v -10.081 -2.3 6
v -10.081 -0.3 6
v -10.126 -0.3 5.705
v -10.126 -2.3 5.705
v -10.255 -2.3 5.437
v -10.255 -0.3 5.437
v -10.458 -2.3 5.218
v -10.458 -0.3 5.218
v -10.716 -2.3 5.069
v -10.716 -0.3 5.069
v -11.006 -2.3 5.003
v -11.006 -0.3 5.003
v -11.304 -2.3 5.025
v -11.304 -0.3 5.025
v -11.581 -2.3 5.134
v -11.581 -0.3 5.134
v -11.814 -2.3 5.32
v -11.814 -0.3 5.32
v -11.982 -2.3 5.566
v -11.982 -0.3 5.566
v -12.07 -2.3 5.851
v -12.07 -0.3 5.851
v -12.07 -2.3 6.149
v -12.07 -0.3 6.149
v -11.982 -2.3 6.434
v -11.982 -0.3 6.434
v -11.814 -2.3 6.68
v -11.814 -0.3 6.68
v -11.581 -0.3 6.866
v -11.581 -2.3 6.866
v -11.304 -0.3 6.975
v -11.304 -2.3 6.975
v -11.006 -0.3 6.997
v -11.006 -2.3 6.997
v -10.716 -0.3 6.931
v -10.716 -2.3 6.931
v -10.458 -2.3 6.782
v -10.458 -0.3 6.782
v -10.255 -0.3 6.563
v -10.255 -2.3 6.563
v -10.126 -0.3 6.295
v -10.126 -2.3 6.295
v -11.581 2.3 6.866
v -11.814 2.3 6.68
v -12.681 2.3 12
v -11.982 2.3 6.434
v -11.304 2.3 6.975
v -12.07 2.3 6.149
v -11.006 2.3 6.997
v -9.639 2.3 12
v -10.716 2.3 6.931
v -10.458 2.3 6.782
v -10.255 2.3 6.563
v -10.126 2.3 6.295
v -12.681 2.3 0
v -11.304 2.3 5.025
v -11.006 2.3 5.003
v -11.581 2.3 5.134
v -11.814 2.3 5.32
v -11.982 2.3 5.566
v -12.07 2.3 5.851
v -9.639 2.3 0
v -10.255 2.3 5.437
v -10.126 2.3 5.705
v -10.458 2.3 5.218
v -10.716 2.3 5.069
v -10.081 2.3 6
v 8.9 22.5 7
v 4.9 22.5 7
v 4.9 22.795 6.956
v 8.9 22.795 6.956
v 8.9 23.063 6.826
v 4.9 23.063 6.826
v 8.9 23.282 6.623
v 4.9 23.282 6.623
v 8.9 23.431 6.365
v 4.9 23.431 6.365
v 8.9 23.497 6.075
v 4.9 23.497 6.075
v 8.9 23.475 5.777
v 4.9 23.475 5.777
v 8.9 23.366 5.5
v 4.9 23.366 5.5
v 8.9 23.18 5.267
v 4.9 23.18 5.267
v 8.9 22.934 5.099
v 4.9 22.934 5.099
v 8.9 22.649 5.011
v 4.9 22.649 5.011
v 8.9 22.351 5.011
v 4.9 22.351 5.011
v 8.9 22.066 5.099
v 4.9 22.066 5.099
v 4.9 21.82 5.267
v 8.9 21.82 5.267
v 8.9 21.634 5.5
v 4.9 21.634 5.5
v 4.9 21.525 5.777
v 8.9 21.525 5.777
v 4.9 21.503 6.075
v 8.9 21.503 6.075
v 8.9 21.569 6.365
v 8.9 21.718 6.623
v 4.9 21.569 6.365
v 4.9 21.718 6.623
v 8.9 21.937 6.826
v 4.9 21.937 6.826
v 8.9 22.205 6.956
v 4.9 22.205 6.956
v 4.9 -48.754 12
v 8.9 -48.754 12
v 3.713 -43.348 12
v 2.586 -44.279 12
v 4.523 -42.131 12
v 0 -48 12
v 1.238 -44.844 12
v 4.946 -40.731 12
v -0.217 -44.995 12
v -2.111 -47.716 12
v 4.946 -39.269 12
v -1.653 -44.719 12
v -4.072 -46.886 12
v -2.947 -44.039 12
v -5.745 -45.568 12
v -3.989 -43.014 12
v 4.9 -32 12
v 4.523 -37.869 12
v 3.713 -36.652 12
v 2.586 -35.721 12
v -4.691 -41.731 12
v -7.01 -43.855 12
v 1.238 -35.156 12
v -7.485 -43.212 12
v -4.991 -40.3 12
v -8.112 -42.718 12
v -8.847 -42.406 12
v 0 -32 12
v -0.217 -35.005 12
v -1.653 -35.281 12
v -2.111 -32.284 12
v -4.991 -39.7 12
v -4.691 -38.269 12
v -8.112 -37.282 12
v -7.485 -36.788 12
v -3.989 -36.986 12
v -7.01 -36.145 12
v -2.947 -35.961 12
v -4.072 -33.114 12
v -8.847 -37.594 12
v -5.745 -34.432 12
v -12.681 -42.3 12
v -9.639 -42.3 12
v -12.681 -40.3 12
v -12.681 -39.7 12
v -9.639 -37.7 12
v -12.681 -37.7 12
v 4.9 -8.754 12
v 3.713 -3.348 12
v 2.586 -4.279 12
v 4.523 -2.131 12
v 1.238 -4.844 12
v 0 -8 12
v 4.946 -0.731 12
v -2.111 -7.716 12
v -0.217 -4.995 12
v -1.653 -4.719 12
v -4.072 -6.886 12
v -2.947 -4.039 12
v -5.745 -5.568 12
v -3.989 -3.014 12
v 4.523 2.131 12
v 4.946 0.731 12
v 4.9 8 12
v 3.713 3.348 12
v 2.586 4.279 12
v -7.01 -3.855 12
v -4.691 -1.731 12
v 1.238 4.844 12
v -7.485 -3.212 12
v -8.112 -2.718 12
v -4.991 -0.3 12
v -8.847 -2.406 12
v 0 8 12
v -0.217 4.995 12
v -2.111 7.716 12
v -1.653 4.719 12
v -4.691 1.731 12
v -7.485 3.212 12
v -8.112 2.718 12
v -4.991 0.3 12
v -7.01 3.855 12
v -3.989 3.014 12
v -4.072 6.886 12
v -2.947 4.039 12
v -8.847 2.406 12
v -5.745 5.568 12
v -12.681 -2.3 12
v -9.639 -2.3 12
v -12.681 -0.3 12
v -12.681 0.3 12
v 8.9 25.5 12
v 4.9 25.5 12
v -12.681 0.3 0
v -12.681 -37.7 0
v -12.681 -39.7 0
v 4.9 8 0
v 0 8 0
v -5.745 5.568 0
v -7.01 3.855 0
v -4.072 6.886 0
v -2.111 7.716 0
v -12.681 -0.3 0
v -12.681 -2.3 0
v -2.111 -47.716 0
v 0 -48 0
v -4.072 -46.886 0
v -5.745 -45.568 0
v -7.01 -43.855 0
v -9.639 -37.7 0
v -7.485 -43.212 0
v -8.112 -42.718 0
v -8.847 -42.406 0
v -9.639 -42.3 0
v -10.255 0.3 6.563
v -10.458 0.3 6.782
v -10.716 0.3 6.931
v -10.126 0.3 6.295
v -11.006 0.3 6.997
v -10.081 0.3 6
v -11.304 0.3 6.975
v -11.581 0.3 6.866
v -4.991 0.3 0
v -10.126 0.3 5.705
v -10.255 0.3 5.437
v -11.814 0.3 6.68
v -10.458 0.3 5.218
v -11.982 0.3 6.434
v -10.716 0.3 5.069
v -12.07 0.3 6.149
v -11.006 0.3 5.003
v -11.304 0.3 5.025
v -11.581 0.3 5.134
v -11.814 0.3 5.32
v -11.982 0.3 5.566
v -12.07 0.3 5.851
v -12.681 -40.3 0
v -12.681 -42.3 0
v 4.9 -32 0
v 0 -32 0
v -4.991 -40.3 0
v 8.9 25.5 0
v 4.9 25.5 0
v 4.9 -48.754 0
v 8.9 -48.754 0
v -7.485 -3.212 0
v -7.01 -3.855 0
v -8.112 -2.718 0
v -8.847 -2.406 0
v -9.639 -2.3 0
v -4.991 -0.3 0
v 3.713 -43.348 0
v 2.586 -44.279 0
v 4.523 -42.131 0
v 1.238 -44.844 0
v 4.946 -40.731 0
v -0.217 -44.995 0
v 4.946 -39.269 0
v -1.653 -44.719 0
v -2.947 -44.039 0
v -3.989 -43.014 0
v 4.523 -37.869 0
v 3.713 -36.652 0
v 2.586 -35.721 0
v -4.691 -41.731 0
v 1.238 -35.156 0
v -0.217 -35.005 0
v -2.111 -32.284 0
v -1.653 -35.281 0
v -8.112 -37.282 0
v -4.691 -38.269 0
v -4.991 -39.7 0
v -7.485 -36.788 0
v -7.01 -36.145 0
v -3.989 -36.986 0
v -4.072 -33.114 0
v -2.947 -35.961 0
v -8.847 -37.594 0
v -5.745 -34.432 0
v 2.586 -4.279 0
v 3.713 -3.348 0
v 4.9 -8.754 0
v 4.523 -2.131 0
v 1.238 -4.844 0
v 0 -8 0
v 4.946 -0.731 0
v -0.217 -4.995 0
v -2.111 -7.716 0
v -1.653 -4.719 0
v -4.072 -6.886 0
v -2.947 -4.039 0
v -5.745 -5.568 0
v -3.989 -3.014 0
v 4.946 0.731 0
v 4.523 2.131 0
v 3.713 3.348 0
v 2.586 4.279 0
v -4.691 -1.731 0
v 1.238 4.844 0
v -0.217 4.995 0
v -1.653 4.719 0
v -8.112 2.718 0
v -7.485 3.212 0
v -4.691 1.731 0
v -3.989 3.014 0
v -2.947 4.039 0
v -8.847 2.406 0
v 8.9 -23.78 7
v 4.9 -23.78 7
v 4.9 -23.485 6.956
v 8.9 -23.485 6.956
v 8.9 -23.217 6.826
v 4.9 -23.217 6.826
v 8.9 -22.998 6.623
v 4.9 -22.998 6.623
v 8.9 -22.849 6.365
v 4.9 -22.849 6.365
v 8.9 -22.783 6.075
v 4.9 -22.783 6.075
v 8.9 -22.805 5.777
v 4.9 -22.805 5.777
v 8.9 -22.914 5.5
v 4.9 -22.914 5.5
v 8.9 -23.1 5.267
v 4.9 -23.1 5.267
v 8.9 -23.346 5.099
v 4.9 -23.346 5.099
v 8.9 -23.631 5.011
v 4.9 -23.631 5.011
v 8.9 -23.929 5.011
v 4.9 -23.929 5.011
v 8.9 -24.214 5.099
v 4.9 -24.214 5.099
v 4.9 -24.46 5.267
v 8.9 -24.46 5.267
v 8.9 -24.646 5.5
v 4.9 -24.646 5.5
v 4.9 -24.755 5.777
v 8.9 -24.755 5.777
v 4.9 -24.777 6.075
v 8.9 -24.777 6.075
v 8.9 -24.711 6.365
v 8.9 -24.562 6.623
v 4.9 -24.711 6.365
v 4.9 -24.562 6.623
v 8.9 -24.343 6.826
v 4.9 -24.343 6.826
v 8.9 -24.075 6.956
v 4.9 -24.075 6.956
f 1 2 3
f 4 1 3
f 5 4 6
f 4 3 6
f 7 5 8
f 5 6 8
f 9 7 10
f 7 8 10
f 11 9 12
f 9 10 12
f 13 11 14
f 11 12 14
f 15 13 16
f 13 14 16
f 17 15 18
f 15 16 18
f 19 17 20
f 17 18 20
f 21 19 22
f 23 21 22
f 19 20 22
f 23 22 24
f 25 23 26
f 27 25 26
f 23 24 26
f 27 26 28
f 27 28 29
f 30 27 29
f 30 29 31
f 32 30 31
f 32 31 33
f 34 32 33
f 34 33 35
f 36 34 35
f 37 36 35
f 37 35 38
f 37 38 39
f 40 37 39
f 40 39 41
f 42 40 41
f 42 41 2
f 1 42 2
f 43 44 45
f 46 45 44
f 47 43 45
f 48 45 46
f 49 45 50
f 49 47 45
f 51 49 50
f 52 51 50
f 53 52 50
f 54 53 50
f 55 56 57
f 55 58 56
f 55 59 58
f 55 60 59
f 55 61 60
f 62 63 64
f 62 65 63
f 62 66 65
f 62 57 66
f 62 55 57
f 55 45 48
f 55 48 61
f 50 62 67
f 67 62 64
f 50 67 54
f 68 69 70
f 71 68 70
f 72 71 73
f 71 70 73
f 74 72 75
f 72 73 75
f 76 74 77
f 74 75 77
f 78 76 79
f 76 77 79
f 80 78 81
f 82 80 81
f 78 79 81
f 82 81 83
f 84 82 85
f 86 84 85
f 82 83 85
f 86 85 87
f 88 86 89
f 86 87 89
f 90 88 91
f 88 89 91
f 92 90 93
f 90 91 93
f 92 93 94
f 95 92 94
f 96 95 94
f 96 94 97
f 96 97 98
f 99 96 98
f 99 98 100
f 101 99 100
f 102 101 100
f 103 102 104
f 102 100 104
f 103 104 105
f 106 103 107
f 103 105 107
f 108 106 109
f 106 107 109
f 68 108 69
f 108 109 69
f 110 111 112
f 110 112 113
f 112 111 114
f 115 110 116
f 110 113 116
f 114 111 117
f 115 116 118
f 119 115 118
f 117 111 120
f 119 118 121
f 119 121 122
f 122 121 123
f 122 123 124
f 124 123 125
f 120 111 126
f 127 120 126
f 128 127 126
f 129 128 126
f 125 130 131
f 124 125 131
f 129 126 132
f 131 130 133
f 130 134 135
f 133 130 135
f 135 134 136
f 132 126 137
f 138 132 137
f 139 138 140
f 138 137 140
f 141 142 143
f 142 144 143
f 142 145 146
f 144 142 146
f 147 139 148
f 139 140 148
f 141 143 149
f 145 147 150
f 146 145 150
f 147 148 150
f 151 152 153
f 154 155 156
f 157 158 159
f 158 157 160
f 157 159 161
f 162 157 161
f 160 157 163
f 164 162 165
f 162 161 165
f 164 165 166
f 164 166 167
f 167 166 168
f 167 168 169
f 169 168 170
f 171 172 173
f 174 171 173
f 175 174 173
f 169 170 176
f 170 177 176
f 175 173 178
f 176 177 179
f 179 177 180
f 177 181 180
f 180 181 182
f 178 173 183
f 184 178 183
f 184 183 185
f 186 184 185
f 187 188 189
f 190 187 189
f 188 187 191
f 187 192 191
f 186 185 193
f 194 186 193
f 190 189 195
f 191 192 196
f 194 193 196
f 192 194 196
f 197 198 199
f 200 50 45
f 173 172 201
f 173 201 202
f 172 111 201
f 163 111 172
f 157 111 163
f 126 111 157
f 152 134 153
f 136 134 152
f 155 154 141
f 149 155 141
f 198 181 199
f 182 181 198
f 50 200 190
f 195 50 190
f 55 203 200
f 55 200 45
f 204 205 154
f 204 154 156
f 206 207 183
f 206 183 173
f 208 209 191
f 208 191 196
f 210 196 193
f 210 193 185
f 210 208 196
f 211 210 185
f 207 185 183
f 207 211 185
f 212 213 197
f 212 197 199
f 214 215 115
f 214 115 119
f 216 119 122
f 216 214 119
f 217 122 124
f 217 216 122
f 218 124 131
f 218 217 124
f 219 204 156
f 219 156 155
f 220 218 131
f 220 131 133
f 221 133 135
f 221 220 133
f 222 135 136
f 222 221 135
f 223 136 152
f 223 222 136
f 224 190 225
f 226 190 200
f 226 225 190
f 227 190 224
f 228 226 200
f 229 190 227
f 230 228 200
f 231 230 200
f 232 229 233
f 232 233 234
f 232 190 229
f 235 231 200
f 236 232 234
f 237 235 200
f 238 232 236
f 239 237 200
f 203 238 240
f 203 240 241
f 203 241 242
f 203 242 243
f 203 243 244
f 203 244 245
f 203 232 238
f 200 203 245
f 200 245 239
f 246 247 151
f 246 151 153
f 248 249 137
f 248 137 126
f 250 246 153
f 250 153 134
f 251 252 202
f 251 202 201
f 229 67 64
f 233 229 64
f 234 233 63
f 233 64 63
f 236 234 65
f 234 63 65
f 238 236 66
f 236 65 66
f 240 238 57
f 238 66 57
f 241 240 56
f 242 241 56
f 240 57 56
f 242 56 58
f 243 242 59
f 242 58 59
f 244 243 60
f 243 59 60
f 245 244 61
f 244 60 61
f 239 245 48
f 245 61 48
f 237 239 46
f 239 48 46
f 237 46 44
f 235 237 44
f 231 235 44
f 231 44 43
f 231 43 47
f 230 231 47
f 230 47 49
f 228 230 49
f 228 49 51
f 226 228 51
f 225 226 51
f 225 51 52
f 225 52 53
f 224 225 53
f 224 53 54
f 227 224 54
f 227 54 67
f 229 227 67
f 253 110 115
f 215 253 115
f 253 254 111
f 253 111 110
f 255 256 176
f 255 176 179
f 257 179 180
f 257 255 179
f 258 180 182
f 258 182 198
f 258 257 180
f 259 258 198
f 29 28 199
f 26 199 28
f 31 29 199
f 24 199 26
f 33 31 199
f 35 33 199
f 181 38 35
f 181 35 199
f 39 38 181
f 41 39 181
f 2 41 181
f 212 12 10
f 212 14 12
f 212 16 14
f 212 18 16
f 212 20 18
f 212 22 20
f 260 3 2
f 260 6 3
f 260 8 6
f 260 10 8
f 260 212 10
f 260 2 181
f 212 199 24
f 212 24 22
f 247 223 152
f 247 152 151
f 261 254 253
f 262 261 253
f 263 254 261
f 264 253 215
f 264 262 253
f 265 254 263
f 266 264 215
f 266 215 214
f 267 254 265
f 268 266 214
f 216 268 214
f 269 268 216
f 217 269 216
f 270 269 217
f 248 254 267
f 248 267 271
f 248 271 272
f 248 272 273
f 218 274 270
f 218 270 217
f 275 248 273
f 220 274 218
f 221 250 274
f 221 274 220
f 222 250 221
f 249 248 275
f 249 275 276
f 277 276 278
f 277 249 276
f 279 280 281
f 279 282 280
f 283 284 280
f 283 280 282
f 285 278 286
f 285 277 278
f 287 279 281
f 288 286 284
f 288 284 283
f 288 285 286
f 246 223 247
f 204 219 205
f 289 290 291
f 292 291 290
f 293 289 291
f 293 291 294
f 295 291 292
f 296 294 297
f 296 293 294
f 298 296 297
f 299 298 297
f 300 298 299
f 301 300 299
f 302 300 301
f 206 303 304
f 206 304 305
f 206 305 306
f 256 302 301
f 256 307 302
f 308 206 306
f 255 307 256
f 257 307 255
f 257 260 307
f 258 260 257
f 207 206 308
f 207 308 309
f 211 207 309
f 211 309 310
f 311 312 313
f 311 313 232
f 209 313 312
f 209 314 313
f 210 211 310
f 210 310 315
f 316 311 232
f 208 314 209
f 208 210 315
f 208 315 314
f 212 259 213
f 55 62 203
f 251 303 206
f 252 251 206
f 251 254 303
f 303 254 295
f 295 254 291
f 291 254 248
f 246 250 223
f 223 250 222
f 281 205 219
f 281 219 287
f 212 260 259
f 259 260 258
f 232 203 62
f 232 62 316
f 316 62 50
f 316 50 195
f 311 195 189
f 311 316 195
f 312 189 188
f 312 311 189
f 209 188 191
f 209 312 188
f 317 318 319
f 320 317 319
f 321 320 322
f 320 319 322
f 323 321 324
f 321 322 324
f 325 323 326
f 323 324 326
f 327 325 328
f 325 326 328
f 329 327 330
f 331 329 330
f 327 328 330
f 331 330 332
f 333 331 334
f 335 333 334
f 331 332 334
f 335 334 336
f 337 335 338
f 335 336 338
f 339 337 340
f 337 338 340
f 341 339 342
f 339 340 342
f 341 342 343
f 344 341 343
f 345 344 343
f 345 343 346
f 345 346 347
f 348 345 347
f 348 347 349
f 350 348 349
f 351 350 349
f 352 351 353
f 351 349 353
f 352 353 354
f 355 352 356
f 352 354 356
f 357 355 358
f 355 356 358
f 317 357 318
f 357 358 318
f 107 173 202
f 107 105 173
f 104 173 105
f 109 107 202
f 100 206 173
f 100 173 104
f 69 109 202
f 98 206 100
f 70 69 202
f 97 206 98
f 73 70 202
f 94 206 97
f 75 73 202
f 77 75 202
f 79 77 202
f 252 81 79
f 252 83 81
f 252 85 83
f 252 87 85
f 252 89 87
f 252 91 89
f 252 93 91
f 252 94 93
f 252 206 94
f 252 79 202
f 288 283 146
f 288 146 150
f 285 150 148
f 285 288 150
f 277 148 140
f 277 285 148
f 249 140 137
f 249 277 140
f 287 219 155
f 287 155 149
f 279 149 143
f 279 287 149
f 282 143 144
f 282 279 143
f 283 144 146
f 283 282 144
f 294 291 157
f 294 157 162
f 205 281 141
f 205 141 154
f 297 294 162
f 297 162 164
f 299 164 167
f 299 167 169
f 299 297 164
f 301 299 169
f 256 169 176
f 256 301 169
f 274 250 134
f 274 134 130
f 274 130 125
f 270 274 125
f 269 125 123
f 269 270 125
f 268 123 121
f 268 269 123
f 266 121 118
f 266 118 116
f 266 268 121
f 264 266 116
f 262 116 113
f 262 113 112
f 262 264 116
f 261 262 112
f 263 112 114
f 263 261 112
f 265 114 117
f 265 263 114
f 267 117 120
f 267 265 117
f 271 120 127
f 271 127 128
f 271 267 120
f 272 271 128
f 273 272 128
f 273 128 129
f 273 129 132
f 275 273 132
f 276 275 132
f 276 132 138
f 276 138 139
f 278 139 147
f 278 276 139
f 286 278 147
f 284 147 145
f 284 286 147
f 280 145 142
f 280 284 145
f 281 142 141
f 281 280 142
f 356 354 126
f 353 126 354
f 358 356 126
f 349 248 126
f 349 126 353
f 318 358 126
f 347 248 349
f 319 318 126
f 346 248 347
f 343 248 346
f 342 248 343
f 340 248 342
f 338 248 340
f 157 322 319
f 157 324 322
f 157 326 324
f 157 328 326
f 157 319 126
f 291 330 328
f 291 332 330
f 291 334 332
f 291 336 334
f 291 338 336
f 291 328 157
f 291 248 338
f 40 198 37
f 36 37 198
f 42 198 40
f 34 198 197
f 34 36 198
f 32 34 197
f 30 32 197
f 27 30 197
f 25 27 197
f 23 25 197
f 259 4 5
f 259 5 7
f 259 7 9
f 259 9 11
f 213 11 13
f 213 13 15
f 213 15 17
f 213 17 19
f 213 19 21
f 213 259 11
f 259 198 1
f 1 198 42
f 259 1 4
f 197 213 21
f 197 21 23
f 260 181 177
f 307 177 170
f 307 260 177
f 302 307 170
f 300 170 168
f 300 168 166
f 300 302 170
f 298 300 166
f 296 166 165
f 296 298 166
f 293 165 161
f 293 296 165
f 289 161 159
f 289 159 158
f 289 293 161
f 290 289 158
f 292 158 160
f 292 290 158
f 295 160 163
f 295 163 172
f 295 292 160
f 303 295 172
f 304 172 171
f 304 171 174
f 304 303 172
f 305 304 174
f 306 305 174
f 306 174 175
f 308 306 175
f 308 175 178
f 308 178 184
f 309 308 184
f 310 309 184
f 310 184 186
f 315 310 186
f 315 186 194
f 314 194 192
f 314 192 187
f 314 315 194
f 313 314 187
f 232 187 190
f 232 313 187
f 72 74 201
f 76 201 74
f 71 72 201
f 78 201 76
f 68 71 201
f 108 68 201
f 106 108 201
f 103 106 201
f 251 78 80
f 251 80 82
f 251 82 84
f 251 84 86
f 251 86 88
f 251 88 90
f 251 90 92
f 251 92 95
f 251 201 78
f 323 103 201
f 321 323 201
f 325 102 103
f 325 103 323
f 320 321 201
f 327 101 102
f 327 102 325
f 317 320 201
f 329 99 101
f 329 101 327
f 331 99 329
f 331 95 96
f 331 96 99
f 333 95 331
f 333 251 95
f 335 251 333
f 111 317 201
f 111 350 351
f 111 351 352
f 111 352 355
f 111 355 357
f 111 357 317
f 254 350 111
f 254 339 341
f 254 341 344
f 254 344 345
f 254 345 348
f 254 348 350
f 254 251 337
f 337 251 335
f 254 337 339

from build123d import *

# Parameters (mm, degrees)
EXTRUDE_1_DEPTH     = 12
SKETCH_2_R          = 1
CUT_EXTRUDE_1_DEPTH = 4
SKETCH_3_R          = 1
CUT_EXTRUDE_2_DEPTH = 10


with BuildPart() as part:
    # 草图1 → 凸台-拉伸1 (new body)
    with BuildSketch(Plane.XY):
        with BuildLine():
            Line((0, 8), (4.9, 8))
            Line((4.9, 8), (4.9, 25.5))
            Line((4.9, 25.5), (8.9, 25.5))
            Line((8.9, 25.5), (8.9, -48.754024521))
            Line((8.9, -48.754024521), (4.9, -48.754024521))
            Line((4.9, -48.754024521), (0, -48))
            ThreePointArc((0, -48), (-4.07207787, -46.886086103), (-7.010169708, -43.854545455))
            ThreePointArc((-7.010169708, -43.854545455), (-8.111954148, -42.717717711), (-9.638983349, -42.3))
            Line((-9.638983349, -42.3), (-12.681165581, -42.3))
            Line((-12.681165581, -42.3), (-12.681165581, -40.3))
            Line((-12.681165581, -40.3), (-4.990991885, -40.3))
            ThreePointArc((-4.990991885, -40.3), (5, -40), (-4.990991885, -39.7))
            Line((-4.990991885, -39.7), (-12.681165581, -39.7))
            Line((-12.681165581, -39.7), (-12.681165581, -37.7))
            Line((-12.681165581, -37.7), (-9.638983349, -37.7))
            ThreePointArc((-9.638983349, -37.7), (-8.111954148, -37.282282289), (-7.010169708, -36.145454545))
            ThreePointArc((-7.010169708, -36.145454545), (-4.07207787, -33.113913897), (0, -32))
            Line((0, -32), (4.9, -32))
            Line((4.9, -32), (4.9, -31))
            Line((4.9, -31), (4.9, -8.754024521))
            Line((4.9, -8.754024521), (0, -8))
            ThreePointArc((0, -8), (-4.07207787, -6.886086103), (-7.010169708, -3.854545455))
            ThreePointArc((-7.010169708, -3.854545455), (-8.111954148, -2.717717711), (-9.638983349, -2.3))
            Line((-9.638983349, -2.3), (-12.681165581, -2.3))
            Line((-12.681165581, -2.3), (-12.681165581, -0.3))
            Line((-12.681165581, -0.3), (-4.990991885, -0.3))
            ThreePointArc((-4.990991885, -0.3), (5, 0), (-4.990991885, 0.3))
            Line((-4.990991885, 0.3), (-12.681165581, 0.3))
            Line((-12.681165581, 0.3), (-12.681165581, 2.3))
            Line((-12.681165581, 2.3), (-9.638983349, 2.3))
            ThreePointArc((-9.638983349, 2.3), (-8.111954148, 2.717717711), (-7.010169708, 3.854545455))
            ThreePointArc((-7.010169708, 3.854545455), (-4.07207787, 6.886086103), (0, 8))
        make_face()
    extrude(amount=EXTRUDE_1_DEPTH)

    # 草图2 → 切除-拉伸1 (cut)
    with BuildSketch(Plane.ZY.offset(-4.9)):
        with Locations((6, 22.5)):
            Circle(SKETCH_2_R)
        with Locations((6, -23.78)):
            Circle(SKETCH_2_R)
    extrude(amount=-CUT_EXTRUDE_1_DEPTH, mode=Mode.SUBTRACT)

    # 草图3 → 切除-拉伸2 (cut)
    with BuildSketch(Plane(origin=(0, 2.3, 0), x_dir=(1, 0, 0), z_dir=(0, 1, 0))):
        with Locations((-11.081165581, -6)):
            Circle(SKETCH_3_R)
    extrude(amount=-CUT_EXTRUDE_2_DEPTH, mode=Mode.SUBTRACT)


solid = part.part
